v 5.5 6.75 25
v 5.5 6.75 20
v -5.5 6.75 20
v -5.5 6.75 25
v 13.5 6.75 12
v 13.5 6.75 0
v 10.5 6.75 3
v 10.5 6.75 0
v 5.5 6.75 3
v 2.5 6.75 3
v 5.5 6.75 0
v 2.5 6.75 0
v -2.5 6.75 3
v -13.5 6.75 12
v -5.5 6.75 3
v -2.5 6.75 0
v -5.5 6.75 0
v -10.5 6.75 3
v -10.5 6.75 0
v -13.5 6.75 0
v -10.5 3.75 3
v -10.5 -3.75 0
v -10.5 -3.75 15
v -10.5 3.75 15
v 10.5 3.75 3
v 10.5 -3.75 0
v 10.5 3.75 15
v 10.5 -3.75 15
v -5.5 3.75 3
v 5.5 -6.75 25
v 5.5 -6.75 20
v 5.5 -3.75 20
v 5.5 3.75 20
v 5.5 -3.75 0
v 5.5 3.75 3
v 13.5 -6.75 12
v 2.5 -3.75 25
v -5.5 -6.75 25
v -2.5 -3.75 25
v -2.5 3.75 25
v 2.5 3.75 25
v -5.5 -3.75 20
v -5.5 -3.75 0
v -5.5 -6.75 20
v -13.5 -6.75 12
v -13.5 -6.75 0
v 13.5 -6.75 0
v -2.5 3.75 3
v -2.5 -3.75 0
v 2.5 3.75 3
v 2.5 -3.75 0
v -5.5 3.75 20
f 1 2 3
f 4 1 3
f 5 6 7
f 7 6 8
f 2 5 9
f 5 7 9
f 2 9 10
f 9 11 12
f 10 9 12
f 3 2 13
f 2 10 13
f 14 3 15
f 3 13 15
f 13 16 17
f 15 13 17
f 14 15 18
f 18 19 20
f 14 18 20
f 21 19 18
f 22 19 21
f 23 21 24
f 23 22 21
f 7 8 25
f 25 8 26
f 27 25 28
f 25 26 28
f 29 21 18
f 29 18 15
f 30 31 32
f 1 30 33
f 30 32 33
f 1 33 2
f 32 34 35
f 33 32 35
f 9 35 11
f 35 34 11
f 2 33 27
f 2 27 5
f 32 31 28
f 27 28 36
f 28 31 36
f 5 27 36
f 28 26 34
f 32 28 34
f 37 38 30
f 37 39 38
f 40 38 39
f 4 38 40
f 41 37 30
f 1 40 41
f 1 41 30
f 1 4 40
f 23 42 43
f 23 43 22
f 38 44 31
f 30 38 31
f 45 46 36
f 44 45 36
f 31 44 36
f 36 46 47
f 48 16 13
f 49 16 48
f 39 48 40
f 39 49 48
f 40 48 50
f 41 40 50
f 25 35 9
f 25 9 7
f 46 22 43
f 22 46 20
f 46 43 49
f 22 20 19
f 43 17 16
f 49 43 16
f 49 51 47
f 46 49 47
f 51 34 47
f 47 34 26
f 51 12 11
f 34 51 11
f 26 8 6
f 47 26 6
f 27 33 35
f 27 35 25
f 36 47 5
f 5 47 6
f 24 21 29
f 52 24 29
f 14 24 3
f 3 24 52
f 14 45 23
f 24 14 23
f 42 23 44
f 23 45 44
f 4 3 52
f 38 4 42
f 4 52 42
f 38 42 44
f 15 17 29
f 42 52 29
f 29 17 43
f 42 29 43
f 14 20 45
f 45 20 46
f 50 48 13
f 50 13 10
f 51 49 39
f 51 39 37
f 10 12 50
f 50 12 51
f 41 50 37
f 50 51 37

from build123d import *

# Parameters (mm, degrees)
F0_W     = 5
F0_H     = 7.5
F1_DEPTH = 25
F2_DEPTH = 20
F4_DEPTH = 25
F5_W     = 5
F5_H     = 3
F6_DEPTH = 25


with BuildPart() as f1:
    # F0 (on Top) → F1 (new body)
    with BuildSketch(Plane.XY):
        Polygon((5.5, 6.75), (-5.5, 6.75), (-5.5, 3.75), (-5.5, -3.75), (-5.5, -6.75), (5.5, -6.75), (5.5, -3.75), (5.5, 3.75), align=None)
        Rectangle(F0_W, F0_H, mode=Mode.SUBTRACT)
    extrude(amount=F1_DEPTH)

    # F0 (on Top) → F2 (join)
    with BuildSketch(Plane.XY):
        Polygon((-5.5, 3.75), (-5.5, 6.75), (-13.5, 6.75), (-13.5, -6.75), (-5.5, -6.75), (-5.5, -3.75), (-10.5, -3.75), (-10.5, 3.75), align=None)
        Polygon((13.5, 6.75), (5.5, 6.75), (5.5, 3.75), (10.5, 3.75), (10.5, -3.75), (5.5, -3.75), (5.5, -6.75), (13.5, -6.75), align=None)
    extrude(amount=F2_DEPTH)

    # F3 (on face) → F4 (cut)
    with BuildSketch(Plane.XZ.offset(6.75)):
        Polygon((-13.5, 12), (-5.5, 20), (-13.5, 20), align=None)
        Polygon((13.5, 20), (5.5, 20), (13.5, 12), align=None)
    extrude(amount=-F4_DEPTH, mode=Mode.SUBTRACT)

    # F5 (on Front) → F6 (cut)
    with BuildSketch(Plane.XZ):
        with Locations((-8, 1.5)):
            Rectangle(F5_W, F5_H)
        with Locations((0, 1.5)):
            Rectangle(F5_W, F5_H)
        with Locations((8, 1.5)):
            Rectangle(F5_W, F5_H)
    extrude(amount=-F6_DEPTH, mode=Mode.SUBTRACT)


solid = f1.part
